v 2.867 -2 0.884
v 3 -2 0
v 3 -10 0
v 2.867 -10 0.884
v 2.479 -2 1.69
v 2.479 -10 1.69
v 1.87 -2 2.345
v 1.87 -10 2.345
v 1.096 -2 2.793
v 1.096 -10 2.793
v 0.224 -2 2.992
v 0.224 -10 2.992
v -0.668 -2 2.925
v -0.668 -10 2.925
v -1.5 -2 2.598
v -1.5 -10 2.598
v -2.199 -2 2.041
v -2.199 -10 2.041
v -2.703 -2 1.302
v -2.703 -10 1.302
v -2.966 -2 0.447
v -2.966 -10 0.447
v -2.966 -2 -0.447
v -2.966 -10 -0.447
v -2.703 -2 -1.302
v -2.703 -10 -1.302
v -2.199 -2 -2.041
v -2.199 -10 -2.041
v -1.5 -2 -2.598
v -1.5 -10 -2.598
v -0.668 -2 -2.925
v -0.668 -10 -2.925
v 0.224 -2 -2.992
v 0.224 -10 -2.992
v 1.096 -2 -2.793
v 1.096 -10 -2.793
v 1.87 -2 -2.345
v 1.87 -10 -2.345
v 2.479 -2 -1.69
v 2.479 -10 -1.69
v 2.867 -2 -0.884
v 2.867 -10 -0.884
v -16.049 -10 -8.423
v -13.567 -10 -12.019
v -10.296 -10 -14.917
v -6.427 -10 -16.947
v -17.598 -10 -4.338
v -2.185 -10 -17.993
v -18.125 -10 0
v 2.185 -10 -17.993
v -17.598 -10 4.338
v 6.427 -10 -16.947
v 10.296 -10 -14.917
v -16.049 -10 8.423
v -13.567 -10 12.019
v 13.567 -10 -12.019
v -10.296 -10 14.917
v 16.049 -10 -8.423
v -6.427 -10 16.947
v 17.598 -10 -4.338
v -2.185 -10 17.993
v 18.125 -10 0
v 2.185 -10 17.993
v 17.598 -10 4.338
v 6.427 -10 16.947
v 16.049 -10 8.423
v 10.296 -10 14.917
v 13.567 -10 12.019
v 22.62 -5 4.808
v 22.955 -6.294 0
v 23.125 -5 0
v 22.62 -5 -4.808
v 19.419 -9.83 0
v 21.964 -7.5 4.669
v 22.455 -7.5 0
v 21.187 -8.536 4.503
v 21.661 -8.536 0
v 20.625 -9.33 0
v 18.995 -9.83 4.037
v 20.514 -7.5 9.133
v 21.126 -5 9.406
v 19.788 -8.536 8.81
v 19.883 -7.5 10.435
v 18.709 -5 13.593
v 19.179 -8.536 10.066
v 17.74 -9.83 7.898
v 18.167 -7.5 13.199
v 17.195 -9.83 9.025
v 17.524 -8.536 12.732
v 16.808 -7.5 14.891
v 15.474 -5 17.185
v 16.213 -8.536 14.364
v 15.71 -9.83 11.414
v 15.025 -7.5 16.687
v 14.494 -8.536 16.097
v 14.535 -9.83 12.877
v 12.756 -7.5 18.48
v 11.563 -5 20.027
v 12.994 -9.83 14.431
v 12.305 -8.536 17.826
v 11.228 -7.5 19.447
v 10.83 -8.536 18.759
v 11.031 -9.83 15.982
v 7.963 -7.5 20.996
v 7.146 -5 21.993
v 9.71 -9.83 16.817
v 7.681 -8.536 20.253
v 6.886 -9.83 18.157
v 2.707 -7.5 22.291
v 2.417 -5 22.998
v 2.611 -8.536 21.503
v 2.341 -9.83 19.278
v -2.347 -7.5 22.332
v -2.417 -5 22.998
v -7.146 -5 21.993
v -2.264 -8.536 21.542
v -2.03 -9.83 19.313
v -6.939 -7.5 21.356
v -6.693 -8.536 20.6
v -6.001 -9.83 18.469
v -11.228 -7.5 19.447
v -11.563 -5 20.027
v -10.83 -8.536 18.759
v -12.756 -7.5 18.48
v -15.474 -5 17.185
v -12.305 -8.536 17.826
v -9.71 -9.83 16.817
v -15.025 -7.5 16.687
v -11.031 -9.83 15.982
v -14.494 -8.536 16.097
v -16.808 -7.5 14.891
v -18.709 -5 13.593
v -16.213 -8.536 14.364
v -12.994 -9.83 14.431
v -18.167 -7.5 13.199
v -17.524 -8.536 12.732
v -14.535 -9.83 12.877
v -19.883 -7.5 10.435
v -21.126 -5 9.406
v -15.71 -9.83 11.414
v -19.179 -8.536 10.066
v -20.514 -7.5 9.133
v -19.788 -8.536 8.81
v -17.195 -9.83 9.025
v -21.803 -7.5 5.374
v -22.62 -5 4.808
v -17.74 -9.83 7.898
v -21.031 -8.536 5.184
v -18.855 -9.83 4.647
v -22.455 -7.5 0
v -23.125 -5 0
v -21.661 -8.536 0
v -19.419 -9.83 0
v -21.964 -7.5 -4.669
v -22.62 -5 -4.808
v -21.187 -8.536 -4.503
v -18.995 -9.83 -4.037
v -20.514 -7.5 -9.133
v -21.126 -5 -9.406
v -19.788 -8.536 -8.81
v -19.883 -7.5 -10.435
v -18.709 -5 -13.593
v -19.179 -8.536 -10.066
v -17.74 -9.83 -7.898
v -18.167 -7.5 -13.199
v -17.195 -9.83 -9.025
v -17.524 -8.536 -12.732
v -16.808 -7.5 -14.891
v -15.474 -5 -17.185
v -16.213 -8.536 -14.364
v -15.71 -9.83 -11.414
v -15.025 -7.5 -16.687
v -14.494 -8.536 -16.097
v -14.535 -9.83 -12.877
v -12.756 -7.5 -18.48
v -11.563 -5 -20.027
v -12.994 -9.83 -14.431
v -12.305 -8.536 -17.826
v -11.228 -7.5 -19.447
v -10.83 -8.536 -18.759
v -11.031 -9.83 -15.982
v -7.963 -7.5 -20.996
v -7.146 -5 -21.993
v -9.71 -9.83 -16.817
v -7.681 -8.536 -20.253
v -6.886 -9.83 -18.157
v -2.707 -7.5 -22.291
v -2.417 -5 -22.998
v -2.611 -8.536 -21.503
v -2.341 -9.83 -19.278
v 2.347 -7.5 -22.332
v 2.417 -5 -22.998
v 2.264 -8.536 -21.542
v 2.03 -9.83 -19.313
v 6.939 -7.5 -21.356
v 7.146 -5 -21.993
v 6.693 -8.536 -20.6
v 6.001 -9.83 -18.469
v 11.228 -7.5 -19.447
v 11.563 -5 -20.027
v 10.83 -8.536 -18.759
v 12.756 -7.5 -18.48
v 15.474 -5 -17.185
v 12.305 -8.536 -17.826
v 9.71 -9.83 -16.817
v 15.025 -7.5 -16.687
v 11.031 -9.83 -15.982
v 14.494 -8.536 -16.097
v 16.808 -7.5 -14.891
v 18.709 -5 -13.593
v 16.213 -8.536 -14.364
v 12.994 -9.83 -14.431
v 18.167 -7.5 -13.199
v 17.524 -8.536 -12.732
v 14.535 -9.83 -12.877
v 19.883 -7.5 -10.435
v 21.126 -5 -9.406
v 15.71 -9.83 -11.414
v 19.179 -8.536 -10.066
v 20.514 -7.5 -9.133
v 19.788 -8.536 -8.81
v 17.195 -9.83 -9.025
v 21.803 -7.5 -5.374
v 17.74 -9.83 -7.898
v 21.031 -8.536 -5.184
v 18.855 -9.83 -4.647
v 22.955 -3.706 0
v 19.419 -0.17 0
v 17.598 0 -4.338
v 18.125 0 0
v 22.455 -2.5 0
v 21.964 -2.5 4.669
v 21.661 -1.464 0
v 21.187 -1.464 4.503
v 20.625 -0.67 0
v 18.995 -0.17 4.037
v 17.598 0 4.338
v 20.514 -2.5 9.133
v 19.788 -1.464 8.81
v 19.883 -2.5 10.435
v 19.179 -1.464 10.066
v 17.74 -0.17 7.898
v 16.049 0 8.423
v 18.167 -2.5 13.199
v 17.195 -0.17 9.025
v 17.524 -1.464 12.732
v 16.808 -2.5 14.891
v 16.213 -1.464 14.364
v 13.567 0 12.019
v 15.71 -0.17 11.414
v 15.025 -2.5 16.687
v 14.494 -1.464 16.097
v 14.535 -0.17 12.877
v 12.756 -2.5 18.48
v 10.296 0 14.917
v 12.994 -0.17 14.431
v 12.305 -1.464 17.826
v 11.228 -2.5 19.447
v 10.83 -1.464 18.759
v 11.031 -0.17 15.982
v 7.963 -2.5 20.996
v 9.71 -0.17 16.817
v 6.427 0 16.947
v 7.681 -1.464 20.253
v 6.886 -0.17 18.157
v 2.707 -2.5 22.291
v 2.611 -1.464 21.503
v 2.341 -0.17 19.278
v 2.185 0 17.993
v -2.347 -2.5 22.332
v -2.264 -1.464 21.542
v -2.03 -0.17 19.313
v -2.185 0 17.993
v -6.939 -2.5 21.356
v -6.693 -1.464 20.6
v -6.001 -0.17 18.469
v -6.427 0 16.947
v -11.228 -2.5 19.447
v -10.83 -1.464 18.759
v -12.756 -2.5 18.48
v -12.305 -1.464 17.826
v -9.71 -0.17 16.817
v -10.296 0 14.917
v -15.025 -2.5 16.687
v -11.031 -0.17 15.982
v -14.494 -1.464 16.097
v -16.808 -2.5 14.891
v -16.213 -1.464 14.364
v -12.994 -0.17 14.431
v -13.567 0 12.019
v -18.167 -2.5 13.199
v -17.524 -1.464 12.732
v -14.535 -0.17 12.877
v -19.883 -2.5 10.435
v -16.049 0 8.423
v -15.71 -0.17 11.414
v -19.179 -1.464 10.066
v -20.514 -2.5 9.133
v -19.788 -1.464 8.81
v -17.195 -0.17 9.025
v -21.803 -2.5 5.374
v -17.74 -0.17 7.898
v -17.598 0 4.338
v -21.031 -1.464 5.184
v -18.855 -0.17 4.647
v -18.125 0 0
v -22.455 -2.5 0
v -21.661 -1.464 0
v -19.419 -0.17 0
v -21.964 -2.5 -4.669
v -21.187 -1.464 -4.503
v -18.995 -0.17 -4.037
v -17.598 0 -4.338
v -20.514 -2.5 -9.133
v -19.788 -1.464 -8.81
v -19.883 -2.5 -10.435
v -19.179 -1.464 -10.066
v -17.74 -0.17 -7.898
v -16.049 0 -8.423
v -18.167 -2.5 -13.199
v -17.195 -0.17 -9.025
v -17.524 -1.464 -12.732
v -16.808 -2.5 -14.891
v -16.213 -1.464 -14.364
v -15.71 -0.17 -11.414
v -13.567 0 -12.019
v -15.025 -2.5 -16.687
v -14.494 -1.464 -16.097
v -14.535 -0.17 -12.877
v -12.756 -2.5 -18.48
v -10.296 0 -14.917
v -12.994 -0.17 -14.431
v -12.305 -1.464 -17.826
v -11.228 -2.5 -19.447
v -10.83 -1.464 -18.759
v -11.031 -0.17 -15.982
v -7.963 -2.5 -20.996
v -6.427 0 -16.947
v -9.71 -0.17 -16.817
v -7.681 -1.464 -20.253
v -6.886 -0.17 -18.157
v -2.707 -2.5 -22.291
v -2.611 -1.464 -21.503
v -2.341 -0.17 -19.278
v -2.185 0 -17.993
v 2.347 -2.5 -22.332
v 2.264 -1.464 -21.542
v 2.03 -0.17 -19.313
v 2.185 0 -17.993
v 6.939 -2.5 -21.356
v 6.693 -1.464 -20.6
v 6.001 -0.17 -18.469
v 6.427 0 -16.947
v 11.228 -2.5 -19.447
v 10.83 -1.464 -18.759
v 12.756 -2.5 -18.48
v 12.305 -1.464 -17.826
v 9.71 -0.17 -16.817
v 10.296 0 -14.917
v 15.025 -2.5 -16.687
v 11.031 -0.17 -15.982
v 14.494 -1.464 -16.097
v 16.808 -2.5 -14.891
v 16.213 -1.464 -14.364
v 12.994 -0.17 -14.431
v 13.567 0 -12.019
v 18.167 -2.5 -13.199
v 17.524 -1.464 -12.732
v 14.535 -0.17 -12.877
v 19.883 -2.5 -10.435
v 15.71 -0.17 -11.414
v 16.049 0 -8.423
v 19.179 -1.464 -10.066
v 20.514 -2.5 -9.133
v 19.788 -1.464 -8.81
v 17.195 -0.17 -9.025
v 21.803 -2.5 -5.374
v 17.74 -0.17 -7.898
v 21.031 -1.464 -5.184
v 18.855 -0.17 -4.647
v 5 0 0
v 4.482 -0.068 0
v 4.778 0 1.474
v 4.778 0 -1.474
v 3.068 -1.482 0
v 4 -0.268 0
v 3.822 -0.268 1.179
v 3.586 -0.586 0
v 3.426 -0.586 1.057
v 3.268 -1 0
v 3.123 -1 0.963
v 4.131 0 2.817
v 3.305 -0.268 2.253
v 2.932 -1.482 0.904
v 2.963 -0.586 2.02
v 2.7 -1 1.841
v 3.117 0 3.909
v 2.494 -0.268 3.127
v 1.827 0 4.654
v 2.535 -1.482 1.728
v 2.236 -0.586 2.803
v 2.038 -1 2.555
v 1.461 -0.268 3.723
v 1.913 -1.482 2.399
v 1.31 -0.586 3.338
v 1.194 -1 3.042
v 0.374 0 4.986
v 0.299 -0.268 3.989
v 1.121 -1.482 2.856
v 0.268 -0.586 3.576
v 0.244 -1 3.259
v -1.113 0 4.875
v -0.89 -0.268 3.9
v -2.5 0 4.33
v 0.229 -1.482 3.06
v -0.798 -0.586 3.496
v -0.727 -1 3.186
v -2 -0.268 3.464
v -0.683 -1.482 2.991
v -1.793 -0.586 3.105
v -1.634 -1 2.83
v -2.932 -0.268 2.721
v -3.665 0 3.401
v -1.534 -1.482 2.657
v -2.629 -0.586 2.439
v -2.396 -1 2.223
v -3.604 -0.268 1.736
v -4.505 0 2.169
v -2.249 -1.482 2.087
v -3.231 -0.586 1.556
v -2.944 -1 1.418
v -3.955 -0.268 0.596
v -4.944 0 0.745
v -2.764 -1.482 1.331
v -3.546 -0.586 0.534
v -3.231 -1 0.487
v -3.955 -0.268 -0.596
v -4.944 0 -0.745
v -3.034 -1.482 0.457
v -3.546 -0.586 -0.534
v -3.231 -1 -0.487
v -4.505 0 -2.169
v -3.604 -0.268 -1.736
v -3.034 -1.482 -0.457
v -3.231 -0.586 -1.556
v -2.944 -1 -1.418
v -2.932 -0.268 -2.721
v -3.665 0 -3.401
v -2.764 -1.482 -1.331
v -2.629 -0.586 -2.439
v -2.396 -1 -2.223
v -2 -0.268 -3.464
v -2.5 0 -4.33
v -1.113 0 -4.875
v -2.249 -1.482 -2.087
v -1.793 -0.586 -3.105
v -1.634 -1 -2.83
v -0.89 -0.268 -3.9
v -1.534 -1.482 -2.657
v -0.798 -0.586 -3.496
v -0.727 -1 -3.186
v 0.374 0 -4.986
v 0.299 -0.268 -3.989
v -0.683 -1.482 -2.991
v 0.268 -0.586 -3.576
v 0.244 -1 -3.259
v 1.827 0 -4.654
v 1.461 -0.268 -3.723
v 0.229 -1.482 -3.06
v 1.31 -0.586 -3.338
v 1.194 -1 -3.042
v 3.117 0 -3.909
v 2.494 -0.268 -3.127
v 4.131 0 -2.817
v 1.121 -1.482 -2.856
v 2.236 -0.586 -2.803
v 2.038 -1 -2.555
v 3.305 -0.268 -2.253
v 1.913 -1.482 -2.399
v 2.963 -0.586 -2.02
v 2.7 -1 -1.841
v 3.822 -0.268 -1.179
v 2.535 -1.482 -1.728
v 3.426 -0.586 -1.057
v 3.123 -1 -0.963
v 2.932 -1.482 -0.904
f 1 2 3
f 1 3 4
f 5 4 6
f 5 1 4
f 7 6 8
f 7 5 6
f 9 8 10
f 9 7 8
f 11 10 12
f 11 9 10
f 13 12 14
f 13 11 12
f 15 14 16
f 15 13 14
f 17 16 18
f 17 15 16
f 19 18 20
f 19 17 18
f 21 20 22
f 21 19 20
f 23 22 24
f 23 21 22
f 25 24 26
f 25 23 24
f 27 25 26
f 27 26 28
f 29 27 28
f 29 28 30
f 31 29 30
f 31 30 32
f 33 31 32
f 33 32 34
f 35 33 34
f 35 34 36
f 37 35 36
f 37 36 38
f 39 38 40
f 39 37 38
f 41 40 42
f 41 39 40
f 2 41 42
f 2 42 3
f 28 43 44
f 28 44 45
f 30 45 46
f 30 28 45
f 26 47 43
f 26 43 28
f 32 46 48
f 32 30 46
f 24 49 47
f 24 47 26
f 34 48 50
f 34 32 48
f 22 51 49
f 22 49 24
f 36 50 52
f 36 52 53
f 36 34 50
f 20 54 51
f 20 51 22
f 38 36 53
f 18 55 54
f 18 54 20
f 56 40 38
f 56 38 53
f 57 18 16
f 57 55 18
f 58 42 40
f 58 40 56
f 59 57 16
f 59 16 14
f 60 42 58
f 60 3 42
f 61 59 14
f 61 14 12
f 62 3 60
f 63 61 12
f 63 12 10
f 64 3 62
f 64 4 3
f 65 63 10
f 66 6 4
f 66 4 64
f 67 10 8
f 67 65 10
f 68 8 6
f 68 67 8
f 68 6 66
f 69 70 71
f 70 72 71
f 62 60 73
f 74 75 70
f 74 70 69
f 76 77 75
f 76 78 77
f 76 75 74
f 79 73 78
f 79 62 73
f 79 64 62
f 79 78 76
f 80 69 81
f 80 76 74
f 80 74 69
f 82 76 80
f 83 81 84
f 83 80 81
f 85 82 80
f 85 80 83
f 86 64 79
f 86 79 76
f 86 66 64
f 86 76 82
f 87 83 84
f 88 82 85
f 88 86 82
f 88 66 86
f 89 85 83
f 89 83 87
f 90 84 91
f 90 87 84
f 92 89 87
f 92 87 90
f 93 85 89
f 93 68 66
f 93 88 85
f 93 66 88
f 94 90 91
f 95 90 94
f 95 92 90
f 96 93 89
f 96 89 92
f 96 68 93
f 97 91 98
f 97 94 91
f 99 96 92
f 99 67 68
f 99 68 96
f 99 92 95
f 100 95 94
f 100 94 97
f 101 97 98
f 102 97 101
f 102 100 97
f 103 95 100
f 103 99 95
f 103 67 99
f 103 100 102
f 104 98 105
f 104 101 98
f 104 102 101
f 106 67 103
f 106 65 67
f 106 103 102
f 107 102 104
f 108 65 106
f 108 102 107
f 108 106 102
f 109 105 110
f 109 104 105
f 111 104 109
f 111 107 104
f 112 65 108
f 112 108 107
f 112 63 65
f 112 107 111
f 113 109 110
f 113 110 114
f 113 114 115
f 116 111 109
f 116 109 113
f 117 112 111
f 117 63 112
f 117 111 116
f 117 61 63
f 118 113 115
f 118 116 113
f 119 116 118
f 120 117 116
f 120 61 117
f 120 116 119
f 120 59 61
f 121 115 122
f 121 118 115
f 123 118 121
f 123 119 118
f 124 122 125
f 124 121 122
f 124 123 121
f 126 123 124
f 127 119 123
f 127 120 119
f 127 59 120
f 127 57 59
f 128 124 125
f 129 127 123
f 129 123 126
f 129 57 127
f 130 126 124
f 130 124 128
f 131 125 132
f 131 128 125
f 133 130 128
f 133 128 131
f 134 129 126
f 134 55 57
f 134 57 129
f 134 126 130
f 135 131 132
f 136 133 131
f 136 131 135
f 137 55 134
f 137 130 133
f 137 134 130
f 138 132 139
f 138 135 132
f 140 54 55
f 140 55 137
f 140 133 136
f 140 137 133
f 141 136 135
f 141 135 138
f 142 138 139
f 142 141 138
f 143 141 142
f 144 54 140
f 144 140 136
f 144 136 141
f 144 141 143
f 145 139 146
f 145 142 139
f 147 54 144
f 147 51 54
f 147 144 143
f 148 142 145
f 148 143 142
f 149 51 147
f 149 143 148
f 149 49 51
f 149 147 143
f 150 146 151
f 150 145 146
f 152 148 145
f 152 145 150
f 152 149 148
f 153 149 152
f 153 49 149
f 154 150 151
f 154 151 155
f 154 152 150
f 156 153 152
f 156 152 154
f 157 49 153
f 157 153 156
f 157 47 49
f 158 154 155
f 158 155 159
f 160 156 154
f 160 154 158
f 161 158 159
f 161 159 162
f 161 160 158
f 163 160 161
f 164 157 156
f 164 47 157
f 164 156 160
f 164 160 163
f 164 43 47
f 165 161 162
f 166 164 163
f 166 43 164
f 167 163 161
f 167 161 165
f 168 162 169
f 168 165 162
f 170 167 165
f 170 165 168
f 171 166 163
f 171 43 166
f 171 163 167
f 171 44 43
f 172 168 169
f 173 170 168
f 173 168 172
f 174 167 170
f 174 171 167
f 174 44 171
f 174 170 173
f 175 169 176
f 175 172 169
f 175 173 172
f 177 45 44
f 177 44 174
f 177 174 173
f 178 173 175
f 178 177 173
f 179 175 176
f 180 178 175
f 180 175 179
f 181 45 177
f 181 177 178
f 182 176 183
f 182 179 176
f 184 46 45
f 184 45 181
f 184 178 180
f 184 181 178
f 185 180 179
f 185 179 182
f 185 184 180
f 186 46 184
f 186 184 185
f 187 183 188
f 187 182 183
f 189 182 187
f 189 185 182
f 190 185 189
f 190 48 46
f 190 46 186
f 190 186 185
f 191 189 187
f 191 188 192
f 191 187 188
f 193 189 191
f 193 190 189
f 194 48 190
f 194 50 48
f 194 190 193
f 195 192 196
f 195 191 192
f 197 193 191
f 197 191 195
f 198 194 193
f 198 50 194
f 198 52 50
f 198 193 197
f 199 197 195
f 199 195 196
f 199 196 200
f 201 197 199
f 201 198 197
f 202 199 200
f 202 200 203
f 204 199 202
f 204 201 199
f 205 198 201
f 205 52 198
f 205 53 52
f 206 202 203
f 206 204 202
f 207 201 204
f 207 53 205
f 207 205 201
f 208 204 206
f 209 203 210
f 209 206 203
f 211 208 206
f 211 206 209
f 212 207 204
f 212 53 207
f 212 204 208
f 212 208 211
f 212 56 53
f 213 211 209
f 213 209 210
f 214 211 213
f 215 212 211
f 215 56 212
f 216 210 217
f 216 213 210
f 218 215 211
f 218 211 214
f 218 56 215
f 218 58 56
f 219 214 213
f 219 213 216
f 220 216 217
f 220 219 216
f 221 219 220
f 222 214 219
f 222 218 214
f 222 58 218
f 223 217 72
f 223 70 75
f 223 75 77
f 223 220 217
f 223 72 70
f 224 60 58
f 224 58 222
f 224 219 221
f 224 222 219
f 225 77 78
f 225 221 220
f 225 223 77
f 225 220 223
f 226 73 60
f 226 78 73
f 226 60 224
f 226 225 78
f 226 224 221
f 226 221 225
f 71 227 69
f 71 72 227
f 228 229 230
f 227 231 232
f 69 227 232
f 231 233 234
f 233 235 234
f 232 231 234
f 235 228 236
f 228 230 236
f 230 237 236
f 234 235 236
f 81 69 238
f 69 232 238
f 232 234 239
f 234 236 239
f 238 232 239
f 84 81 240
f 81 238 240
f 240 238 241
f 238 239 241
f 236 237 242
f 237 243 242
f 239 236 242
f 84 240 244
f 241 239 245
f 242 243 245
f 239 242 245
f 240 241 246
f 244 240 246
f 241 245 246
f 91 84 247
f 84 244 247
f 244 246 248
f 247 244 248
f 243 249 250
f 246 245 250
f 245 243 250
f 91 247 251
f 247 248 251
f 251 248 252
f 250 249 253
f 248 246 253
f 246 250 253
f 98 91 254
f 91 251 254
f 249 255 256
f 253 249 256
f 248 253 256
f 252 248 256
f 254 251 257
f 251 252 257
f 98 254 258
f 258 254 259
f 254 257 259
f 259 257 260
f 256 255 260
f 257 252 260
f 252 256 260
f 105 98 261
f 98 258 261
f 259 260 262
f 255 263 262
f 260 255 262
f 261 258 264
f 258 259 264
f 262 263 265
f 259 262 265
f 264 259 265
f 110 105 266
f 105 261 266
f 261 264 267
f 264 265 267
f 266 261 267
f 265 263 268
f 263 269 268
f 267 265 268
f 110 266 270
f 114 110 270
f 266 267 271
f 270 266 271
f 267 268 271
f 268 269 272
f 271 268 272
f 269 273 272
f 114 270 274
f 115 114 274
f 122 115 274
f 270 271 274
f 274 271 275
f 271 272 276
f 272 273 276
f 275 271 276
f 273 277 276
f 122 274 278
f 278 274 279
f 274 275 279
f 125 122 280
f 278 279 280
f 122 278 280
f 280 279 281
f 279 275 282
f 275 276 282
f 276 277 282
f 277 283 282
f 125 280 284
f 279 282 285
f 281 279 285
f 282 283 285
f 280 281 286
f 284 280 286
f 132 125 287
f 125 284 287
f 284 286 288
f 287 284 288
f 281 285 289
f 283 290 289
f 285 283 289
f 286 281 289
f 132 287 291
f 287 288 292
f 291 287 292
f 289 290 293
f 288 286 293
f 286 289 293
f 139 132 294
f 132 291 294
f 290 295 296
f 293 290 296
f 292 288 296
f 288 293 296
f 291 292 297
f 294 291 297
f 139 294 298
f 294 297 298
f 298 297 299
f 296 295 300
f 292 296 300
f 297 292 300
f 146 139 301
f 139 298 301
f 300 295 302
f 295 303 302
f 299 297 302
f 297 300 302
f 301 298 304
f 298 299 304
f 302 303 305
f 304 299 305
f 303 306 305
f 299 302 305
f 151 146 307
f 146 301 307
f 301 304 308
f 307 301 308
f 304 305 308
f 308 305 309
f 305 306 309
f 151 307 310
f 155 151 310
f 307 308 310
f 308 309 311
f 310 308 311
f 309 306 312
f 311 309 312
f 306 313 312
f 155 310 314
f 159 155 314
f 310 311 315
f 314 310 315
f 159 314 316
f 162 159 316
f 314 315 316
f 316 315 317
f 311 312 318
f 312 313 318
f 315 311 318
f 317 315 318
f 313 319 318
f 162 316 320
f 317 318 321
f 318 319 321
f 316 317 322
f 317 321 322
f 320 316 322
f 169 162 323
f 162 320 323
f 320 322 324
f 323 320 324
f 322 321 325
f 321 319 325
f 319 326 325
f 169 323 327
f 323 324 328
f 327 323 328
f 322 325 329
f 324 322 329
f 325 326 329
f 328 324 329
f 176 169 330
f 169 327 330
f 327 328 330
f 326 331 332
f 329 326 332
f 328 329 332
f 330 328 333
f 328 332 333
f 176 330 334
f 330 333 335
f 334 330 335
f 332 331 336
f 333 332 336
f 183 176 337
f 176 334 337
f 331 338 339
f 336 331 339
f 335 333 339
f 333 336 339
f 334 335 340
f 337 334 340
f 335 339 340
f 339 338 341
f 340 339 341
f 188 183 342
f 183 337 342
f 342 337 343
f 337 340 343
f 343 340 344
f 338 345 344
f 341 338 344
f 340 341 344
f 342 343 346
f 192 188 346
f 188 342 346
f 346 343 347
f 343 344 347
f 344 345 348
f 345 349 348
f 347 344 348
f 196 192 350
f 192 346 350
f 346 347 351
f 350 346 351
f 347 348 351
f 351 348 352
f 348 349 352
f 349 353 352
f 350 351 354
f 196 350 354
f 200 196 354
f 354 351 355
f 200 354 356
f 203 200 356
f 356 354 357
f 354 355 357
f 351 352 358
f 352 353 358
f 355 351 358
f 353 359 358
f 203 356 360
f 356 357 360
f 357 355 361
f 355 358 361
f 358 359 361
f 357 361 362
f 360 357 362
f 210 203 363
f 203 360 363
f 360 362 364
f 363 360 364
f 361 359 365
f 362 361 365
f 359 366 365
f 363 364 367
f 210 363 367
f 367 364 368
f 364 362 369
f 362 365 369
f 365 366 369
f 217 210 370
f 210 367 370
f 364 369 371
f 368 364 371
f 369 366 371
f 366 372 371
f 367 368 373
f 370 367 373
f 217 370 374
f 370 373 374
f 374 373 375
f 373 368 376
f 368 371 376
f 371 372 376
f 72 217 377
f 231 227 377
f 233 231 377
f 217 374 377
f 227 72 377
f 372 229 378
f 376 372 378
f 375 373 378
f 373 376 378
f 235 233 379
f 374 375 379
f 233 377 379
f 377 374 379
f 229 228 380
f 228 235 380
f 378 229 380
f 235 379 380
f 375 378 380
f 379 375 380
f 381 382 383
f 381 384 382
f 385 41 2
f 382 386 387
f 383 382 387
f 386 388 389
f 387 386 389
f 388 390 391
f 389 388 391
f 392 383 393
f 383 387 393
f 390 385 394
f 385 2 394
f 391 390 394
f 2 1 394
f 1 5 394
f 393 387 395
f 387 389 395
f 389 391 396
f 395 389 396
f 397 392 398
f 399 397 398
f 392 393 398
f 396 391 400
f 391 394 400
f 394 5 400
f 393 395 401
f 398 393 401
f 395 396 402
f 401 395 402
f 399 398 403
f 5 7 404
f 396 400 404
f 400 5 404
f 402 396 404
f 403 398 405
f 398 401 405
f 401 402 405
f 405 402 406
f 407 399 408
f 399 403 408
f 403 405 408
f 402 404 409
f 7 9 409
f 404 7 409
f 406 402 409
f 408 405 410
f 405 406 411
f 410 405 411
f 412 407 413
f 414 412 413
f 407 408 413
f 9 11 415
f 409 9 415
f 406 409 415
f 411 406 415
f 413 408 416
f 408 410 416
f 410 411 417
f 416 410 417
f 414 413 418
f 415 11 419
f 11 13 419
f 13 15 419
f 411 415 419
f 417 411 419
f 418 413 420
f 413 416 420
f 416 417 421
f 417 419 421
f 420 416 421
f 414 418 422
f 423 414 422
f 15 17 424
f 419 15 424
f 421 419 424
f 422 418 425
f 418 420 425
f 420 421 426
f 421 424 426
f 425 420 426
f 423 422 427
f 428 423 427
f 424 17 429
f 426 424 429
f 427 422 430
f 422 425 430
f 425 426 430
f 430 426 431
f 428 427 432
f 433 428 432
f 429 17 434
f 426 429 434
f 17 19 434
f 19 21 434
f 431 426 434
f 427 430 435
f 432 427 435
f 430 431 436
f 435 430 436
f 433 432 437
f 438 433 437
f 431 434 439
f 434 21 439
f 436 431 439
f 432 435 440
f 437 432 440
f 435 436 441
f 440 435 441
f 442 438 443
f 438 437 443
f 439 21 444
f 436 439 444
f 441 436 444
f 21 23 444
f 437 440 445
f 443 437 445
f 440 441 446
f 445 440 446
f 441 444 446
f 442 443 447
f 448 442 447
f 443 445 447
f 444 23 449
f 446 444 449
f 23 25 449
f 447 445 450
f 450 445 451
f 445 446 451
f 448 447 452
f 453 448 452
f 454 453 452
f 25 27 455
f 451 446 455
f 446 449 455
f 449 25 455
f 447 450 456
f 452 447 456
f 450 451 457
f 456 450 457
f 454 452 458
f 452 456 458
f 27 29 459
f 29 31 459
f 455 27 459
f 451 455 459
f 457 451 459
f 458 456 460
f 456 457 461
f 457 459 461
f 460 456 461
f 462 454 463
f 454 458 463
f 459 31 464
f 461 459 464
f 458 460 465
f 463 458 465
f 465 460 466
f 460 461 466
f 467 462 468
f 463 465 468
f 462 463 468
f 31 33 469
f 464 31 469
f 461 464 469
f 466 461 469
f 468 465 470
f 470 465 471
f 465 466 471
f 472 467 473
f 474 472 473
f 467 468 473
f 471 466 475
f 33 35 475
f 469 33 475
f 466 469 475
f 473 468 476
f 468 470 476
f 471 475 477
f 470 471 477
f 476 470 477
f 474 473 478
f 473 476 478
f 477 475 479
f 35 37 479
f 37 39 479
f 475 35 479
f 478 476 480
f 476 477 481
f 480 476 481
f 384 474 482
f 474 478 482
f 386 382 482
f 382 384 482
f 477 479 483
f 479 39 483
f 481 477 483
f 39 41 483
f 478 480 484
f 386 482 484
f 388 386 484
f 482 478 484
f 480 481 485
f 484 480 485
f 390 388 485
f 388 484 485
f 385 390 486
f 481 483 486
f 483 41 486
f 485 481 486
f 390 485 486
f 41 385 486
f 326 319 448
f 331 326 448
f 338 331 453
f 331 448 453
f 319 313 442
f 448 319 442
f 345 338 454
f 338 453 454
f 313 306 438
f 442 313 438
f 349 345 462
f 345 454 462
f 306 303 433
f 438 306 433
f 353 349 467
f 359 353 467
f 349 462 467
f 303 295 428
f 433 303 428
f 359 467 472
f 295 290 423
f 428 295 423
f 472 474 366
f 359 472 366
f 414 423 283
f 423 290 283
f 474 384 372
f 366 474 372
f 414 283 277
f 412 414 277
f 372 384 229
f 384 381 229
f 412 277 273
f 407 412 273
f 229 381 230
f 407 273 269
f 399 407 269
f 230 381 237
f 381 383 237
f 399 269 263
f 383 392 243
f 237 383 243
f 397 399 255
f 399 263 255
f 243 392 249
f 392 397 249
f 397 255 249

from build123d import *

# Parameters (mm, degrees)
F0_R     = 23.125
F0_R_2   = 3
F1_DEPTH = 10
F2_R     = 4.99999
F3_R     = 2


# Not quite as in the source:
# - a fillet or chamfer is up to 0.001 mm smaller than in the source, because OpenCascade refuses the exact size


with BuildPart() as f1:
    # F0 (on Front) → F1 (new body)
    with BuildSketch(Plane.XZ):
        Circle(F0_R)
        Circle(F0_R_2, mode=Mode.SUBTRACT)
    extrude(amount=F1_DEPTH)

    # F2 (radius 5 in the source; OpenCascade refuses exactly that, so slightly less here)
    f2_edges = [f1.edges().sort_by_distance(p)[0] for p in [
        (-23.125, 0, 0),
        (-23.125, -10, 0),
    ]]
    fillet(f2_edges, radius=F2_R)

    # F3
    f3_edges = [f1.edges().sort_by_distance(p)[0] for p in [
        (-3, 0, 0),
        (-18.12501, 0, 0),
    ]]
    fillet(f3_edges, radius=F3_R)


solid = f1.part
